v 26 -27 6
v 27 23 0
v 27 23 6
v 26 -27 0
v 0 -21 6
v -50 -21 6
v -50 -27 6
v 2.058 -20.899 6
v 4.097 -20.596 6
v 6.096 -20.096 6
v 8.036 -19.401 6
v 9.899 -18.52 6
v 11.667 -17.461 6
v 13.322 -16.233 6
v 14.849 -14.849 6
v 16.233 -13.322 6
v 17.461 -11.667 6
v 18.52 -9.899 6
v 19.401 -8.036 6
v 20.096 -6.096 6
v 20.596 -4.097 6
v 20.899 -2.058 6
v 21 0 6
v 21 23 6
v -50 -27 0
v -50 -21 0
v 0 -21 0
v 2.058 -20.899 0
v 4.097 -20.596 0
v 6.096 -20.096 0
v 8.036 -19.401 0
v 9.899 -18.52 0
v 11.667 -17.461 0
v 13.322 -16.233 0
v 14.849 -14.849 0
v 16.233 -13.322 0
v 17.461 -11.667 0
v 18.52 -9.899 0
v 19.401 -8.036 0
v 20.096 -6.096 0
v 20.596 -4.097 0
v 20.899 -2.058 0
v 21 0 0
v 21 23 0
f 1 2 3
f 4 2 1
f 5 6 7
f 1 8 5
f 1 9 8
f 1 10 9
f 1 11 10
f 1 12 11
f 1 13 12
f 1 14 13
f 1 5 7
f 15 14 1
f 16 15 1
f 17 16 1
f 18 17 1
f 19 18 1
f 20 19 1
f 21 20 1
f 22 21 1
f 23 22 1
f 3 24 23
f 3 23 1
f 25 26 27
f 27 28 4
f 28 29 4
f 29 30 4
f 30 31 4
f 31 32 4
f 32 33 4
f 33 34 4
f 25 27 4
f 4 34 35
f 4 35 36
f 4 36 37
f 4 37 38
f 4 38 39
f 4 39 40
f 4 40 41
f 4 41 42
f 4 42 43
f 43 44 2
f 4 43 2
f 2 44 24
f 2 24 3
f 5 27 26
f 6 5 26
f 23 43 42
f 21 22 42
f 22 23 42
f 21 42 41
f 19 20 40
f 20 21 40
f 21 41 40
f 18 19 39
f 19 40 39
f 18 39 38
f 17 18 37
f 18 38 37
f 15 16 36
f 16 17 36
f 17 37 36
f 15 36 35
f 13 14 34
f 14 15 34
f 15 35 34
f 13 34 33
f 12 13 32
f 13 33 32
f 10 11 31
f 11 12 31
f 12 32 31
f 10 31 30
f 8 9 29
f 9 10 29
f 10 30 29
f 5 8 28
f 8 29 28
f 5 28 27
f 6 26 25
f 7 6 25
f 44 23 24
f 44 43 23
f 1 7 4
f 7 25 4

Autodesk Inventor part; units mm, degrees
ref_plane "YZ Plane" through (0, 0, 0) normal (1, 0, 0) x (0, 1, 0)
ref_plane "XZ Plane" through (0, 0, 0) normal (0, 1, 0) x (-1, 0, 0)
ref_plane "XY Plane" through (0, 0, 0) normal (0, 0, 1) x (1, 0, 0)
sketch "Sketch1" plane through (0, 0, 0) normal (0, 0, 1) x (1, 0, 0)
  circle A0 centre (0, 0) radius 21
  line L0 (0, -21) -> (-50, -21)
  line L1 (-50, -21) -> (-50, -27)
  line L2 (-50, -27) -> (49, -27)
  line L3 (21, 0) -> (21, 23)
  line L4 (21, 23) -> (27, 23)
  line L5 (27, 23) -> (26, -27)
  dimension "d0" = 42
  dimension "d1" = 50
  dimension "d2" = 6
  dimension "d4" = 6
  dimension "d5" = 50
extrude "Extrusion1" add sketch "Sketch1" along normal blind 6 contours L3 L4 L5 L2 L1 L0 A0
properties part number "hOLD_2"
